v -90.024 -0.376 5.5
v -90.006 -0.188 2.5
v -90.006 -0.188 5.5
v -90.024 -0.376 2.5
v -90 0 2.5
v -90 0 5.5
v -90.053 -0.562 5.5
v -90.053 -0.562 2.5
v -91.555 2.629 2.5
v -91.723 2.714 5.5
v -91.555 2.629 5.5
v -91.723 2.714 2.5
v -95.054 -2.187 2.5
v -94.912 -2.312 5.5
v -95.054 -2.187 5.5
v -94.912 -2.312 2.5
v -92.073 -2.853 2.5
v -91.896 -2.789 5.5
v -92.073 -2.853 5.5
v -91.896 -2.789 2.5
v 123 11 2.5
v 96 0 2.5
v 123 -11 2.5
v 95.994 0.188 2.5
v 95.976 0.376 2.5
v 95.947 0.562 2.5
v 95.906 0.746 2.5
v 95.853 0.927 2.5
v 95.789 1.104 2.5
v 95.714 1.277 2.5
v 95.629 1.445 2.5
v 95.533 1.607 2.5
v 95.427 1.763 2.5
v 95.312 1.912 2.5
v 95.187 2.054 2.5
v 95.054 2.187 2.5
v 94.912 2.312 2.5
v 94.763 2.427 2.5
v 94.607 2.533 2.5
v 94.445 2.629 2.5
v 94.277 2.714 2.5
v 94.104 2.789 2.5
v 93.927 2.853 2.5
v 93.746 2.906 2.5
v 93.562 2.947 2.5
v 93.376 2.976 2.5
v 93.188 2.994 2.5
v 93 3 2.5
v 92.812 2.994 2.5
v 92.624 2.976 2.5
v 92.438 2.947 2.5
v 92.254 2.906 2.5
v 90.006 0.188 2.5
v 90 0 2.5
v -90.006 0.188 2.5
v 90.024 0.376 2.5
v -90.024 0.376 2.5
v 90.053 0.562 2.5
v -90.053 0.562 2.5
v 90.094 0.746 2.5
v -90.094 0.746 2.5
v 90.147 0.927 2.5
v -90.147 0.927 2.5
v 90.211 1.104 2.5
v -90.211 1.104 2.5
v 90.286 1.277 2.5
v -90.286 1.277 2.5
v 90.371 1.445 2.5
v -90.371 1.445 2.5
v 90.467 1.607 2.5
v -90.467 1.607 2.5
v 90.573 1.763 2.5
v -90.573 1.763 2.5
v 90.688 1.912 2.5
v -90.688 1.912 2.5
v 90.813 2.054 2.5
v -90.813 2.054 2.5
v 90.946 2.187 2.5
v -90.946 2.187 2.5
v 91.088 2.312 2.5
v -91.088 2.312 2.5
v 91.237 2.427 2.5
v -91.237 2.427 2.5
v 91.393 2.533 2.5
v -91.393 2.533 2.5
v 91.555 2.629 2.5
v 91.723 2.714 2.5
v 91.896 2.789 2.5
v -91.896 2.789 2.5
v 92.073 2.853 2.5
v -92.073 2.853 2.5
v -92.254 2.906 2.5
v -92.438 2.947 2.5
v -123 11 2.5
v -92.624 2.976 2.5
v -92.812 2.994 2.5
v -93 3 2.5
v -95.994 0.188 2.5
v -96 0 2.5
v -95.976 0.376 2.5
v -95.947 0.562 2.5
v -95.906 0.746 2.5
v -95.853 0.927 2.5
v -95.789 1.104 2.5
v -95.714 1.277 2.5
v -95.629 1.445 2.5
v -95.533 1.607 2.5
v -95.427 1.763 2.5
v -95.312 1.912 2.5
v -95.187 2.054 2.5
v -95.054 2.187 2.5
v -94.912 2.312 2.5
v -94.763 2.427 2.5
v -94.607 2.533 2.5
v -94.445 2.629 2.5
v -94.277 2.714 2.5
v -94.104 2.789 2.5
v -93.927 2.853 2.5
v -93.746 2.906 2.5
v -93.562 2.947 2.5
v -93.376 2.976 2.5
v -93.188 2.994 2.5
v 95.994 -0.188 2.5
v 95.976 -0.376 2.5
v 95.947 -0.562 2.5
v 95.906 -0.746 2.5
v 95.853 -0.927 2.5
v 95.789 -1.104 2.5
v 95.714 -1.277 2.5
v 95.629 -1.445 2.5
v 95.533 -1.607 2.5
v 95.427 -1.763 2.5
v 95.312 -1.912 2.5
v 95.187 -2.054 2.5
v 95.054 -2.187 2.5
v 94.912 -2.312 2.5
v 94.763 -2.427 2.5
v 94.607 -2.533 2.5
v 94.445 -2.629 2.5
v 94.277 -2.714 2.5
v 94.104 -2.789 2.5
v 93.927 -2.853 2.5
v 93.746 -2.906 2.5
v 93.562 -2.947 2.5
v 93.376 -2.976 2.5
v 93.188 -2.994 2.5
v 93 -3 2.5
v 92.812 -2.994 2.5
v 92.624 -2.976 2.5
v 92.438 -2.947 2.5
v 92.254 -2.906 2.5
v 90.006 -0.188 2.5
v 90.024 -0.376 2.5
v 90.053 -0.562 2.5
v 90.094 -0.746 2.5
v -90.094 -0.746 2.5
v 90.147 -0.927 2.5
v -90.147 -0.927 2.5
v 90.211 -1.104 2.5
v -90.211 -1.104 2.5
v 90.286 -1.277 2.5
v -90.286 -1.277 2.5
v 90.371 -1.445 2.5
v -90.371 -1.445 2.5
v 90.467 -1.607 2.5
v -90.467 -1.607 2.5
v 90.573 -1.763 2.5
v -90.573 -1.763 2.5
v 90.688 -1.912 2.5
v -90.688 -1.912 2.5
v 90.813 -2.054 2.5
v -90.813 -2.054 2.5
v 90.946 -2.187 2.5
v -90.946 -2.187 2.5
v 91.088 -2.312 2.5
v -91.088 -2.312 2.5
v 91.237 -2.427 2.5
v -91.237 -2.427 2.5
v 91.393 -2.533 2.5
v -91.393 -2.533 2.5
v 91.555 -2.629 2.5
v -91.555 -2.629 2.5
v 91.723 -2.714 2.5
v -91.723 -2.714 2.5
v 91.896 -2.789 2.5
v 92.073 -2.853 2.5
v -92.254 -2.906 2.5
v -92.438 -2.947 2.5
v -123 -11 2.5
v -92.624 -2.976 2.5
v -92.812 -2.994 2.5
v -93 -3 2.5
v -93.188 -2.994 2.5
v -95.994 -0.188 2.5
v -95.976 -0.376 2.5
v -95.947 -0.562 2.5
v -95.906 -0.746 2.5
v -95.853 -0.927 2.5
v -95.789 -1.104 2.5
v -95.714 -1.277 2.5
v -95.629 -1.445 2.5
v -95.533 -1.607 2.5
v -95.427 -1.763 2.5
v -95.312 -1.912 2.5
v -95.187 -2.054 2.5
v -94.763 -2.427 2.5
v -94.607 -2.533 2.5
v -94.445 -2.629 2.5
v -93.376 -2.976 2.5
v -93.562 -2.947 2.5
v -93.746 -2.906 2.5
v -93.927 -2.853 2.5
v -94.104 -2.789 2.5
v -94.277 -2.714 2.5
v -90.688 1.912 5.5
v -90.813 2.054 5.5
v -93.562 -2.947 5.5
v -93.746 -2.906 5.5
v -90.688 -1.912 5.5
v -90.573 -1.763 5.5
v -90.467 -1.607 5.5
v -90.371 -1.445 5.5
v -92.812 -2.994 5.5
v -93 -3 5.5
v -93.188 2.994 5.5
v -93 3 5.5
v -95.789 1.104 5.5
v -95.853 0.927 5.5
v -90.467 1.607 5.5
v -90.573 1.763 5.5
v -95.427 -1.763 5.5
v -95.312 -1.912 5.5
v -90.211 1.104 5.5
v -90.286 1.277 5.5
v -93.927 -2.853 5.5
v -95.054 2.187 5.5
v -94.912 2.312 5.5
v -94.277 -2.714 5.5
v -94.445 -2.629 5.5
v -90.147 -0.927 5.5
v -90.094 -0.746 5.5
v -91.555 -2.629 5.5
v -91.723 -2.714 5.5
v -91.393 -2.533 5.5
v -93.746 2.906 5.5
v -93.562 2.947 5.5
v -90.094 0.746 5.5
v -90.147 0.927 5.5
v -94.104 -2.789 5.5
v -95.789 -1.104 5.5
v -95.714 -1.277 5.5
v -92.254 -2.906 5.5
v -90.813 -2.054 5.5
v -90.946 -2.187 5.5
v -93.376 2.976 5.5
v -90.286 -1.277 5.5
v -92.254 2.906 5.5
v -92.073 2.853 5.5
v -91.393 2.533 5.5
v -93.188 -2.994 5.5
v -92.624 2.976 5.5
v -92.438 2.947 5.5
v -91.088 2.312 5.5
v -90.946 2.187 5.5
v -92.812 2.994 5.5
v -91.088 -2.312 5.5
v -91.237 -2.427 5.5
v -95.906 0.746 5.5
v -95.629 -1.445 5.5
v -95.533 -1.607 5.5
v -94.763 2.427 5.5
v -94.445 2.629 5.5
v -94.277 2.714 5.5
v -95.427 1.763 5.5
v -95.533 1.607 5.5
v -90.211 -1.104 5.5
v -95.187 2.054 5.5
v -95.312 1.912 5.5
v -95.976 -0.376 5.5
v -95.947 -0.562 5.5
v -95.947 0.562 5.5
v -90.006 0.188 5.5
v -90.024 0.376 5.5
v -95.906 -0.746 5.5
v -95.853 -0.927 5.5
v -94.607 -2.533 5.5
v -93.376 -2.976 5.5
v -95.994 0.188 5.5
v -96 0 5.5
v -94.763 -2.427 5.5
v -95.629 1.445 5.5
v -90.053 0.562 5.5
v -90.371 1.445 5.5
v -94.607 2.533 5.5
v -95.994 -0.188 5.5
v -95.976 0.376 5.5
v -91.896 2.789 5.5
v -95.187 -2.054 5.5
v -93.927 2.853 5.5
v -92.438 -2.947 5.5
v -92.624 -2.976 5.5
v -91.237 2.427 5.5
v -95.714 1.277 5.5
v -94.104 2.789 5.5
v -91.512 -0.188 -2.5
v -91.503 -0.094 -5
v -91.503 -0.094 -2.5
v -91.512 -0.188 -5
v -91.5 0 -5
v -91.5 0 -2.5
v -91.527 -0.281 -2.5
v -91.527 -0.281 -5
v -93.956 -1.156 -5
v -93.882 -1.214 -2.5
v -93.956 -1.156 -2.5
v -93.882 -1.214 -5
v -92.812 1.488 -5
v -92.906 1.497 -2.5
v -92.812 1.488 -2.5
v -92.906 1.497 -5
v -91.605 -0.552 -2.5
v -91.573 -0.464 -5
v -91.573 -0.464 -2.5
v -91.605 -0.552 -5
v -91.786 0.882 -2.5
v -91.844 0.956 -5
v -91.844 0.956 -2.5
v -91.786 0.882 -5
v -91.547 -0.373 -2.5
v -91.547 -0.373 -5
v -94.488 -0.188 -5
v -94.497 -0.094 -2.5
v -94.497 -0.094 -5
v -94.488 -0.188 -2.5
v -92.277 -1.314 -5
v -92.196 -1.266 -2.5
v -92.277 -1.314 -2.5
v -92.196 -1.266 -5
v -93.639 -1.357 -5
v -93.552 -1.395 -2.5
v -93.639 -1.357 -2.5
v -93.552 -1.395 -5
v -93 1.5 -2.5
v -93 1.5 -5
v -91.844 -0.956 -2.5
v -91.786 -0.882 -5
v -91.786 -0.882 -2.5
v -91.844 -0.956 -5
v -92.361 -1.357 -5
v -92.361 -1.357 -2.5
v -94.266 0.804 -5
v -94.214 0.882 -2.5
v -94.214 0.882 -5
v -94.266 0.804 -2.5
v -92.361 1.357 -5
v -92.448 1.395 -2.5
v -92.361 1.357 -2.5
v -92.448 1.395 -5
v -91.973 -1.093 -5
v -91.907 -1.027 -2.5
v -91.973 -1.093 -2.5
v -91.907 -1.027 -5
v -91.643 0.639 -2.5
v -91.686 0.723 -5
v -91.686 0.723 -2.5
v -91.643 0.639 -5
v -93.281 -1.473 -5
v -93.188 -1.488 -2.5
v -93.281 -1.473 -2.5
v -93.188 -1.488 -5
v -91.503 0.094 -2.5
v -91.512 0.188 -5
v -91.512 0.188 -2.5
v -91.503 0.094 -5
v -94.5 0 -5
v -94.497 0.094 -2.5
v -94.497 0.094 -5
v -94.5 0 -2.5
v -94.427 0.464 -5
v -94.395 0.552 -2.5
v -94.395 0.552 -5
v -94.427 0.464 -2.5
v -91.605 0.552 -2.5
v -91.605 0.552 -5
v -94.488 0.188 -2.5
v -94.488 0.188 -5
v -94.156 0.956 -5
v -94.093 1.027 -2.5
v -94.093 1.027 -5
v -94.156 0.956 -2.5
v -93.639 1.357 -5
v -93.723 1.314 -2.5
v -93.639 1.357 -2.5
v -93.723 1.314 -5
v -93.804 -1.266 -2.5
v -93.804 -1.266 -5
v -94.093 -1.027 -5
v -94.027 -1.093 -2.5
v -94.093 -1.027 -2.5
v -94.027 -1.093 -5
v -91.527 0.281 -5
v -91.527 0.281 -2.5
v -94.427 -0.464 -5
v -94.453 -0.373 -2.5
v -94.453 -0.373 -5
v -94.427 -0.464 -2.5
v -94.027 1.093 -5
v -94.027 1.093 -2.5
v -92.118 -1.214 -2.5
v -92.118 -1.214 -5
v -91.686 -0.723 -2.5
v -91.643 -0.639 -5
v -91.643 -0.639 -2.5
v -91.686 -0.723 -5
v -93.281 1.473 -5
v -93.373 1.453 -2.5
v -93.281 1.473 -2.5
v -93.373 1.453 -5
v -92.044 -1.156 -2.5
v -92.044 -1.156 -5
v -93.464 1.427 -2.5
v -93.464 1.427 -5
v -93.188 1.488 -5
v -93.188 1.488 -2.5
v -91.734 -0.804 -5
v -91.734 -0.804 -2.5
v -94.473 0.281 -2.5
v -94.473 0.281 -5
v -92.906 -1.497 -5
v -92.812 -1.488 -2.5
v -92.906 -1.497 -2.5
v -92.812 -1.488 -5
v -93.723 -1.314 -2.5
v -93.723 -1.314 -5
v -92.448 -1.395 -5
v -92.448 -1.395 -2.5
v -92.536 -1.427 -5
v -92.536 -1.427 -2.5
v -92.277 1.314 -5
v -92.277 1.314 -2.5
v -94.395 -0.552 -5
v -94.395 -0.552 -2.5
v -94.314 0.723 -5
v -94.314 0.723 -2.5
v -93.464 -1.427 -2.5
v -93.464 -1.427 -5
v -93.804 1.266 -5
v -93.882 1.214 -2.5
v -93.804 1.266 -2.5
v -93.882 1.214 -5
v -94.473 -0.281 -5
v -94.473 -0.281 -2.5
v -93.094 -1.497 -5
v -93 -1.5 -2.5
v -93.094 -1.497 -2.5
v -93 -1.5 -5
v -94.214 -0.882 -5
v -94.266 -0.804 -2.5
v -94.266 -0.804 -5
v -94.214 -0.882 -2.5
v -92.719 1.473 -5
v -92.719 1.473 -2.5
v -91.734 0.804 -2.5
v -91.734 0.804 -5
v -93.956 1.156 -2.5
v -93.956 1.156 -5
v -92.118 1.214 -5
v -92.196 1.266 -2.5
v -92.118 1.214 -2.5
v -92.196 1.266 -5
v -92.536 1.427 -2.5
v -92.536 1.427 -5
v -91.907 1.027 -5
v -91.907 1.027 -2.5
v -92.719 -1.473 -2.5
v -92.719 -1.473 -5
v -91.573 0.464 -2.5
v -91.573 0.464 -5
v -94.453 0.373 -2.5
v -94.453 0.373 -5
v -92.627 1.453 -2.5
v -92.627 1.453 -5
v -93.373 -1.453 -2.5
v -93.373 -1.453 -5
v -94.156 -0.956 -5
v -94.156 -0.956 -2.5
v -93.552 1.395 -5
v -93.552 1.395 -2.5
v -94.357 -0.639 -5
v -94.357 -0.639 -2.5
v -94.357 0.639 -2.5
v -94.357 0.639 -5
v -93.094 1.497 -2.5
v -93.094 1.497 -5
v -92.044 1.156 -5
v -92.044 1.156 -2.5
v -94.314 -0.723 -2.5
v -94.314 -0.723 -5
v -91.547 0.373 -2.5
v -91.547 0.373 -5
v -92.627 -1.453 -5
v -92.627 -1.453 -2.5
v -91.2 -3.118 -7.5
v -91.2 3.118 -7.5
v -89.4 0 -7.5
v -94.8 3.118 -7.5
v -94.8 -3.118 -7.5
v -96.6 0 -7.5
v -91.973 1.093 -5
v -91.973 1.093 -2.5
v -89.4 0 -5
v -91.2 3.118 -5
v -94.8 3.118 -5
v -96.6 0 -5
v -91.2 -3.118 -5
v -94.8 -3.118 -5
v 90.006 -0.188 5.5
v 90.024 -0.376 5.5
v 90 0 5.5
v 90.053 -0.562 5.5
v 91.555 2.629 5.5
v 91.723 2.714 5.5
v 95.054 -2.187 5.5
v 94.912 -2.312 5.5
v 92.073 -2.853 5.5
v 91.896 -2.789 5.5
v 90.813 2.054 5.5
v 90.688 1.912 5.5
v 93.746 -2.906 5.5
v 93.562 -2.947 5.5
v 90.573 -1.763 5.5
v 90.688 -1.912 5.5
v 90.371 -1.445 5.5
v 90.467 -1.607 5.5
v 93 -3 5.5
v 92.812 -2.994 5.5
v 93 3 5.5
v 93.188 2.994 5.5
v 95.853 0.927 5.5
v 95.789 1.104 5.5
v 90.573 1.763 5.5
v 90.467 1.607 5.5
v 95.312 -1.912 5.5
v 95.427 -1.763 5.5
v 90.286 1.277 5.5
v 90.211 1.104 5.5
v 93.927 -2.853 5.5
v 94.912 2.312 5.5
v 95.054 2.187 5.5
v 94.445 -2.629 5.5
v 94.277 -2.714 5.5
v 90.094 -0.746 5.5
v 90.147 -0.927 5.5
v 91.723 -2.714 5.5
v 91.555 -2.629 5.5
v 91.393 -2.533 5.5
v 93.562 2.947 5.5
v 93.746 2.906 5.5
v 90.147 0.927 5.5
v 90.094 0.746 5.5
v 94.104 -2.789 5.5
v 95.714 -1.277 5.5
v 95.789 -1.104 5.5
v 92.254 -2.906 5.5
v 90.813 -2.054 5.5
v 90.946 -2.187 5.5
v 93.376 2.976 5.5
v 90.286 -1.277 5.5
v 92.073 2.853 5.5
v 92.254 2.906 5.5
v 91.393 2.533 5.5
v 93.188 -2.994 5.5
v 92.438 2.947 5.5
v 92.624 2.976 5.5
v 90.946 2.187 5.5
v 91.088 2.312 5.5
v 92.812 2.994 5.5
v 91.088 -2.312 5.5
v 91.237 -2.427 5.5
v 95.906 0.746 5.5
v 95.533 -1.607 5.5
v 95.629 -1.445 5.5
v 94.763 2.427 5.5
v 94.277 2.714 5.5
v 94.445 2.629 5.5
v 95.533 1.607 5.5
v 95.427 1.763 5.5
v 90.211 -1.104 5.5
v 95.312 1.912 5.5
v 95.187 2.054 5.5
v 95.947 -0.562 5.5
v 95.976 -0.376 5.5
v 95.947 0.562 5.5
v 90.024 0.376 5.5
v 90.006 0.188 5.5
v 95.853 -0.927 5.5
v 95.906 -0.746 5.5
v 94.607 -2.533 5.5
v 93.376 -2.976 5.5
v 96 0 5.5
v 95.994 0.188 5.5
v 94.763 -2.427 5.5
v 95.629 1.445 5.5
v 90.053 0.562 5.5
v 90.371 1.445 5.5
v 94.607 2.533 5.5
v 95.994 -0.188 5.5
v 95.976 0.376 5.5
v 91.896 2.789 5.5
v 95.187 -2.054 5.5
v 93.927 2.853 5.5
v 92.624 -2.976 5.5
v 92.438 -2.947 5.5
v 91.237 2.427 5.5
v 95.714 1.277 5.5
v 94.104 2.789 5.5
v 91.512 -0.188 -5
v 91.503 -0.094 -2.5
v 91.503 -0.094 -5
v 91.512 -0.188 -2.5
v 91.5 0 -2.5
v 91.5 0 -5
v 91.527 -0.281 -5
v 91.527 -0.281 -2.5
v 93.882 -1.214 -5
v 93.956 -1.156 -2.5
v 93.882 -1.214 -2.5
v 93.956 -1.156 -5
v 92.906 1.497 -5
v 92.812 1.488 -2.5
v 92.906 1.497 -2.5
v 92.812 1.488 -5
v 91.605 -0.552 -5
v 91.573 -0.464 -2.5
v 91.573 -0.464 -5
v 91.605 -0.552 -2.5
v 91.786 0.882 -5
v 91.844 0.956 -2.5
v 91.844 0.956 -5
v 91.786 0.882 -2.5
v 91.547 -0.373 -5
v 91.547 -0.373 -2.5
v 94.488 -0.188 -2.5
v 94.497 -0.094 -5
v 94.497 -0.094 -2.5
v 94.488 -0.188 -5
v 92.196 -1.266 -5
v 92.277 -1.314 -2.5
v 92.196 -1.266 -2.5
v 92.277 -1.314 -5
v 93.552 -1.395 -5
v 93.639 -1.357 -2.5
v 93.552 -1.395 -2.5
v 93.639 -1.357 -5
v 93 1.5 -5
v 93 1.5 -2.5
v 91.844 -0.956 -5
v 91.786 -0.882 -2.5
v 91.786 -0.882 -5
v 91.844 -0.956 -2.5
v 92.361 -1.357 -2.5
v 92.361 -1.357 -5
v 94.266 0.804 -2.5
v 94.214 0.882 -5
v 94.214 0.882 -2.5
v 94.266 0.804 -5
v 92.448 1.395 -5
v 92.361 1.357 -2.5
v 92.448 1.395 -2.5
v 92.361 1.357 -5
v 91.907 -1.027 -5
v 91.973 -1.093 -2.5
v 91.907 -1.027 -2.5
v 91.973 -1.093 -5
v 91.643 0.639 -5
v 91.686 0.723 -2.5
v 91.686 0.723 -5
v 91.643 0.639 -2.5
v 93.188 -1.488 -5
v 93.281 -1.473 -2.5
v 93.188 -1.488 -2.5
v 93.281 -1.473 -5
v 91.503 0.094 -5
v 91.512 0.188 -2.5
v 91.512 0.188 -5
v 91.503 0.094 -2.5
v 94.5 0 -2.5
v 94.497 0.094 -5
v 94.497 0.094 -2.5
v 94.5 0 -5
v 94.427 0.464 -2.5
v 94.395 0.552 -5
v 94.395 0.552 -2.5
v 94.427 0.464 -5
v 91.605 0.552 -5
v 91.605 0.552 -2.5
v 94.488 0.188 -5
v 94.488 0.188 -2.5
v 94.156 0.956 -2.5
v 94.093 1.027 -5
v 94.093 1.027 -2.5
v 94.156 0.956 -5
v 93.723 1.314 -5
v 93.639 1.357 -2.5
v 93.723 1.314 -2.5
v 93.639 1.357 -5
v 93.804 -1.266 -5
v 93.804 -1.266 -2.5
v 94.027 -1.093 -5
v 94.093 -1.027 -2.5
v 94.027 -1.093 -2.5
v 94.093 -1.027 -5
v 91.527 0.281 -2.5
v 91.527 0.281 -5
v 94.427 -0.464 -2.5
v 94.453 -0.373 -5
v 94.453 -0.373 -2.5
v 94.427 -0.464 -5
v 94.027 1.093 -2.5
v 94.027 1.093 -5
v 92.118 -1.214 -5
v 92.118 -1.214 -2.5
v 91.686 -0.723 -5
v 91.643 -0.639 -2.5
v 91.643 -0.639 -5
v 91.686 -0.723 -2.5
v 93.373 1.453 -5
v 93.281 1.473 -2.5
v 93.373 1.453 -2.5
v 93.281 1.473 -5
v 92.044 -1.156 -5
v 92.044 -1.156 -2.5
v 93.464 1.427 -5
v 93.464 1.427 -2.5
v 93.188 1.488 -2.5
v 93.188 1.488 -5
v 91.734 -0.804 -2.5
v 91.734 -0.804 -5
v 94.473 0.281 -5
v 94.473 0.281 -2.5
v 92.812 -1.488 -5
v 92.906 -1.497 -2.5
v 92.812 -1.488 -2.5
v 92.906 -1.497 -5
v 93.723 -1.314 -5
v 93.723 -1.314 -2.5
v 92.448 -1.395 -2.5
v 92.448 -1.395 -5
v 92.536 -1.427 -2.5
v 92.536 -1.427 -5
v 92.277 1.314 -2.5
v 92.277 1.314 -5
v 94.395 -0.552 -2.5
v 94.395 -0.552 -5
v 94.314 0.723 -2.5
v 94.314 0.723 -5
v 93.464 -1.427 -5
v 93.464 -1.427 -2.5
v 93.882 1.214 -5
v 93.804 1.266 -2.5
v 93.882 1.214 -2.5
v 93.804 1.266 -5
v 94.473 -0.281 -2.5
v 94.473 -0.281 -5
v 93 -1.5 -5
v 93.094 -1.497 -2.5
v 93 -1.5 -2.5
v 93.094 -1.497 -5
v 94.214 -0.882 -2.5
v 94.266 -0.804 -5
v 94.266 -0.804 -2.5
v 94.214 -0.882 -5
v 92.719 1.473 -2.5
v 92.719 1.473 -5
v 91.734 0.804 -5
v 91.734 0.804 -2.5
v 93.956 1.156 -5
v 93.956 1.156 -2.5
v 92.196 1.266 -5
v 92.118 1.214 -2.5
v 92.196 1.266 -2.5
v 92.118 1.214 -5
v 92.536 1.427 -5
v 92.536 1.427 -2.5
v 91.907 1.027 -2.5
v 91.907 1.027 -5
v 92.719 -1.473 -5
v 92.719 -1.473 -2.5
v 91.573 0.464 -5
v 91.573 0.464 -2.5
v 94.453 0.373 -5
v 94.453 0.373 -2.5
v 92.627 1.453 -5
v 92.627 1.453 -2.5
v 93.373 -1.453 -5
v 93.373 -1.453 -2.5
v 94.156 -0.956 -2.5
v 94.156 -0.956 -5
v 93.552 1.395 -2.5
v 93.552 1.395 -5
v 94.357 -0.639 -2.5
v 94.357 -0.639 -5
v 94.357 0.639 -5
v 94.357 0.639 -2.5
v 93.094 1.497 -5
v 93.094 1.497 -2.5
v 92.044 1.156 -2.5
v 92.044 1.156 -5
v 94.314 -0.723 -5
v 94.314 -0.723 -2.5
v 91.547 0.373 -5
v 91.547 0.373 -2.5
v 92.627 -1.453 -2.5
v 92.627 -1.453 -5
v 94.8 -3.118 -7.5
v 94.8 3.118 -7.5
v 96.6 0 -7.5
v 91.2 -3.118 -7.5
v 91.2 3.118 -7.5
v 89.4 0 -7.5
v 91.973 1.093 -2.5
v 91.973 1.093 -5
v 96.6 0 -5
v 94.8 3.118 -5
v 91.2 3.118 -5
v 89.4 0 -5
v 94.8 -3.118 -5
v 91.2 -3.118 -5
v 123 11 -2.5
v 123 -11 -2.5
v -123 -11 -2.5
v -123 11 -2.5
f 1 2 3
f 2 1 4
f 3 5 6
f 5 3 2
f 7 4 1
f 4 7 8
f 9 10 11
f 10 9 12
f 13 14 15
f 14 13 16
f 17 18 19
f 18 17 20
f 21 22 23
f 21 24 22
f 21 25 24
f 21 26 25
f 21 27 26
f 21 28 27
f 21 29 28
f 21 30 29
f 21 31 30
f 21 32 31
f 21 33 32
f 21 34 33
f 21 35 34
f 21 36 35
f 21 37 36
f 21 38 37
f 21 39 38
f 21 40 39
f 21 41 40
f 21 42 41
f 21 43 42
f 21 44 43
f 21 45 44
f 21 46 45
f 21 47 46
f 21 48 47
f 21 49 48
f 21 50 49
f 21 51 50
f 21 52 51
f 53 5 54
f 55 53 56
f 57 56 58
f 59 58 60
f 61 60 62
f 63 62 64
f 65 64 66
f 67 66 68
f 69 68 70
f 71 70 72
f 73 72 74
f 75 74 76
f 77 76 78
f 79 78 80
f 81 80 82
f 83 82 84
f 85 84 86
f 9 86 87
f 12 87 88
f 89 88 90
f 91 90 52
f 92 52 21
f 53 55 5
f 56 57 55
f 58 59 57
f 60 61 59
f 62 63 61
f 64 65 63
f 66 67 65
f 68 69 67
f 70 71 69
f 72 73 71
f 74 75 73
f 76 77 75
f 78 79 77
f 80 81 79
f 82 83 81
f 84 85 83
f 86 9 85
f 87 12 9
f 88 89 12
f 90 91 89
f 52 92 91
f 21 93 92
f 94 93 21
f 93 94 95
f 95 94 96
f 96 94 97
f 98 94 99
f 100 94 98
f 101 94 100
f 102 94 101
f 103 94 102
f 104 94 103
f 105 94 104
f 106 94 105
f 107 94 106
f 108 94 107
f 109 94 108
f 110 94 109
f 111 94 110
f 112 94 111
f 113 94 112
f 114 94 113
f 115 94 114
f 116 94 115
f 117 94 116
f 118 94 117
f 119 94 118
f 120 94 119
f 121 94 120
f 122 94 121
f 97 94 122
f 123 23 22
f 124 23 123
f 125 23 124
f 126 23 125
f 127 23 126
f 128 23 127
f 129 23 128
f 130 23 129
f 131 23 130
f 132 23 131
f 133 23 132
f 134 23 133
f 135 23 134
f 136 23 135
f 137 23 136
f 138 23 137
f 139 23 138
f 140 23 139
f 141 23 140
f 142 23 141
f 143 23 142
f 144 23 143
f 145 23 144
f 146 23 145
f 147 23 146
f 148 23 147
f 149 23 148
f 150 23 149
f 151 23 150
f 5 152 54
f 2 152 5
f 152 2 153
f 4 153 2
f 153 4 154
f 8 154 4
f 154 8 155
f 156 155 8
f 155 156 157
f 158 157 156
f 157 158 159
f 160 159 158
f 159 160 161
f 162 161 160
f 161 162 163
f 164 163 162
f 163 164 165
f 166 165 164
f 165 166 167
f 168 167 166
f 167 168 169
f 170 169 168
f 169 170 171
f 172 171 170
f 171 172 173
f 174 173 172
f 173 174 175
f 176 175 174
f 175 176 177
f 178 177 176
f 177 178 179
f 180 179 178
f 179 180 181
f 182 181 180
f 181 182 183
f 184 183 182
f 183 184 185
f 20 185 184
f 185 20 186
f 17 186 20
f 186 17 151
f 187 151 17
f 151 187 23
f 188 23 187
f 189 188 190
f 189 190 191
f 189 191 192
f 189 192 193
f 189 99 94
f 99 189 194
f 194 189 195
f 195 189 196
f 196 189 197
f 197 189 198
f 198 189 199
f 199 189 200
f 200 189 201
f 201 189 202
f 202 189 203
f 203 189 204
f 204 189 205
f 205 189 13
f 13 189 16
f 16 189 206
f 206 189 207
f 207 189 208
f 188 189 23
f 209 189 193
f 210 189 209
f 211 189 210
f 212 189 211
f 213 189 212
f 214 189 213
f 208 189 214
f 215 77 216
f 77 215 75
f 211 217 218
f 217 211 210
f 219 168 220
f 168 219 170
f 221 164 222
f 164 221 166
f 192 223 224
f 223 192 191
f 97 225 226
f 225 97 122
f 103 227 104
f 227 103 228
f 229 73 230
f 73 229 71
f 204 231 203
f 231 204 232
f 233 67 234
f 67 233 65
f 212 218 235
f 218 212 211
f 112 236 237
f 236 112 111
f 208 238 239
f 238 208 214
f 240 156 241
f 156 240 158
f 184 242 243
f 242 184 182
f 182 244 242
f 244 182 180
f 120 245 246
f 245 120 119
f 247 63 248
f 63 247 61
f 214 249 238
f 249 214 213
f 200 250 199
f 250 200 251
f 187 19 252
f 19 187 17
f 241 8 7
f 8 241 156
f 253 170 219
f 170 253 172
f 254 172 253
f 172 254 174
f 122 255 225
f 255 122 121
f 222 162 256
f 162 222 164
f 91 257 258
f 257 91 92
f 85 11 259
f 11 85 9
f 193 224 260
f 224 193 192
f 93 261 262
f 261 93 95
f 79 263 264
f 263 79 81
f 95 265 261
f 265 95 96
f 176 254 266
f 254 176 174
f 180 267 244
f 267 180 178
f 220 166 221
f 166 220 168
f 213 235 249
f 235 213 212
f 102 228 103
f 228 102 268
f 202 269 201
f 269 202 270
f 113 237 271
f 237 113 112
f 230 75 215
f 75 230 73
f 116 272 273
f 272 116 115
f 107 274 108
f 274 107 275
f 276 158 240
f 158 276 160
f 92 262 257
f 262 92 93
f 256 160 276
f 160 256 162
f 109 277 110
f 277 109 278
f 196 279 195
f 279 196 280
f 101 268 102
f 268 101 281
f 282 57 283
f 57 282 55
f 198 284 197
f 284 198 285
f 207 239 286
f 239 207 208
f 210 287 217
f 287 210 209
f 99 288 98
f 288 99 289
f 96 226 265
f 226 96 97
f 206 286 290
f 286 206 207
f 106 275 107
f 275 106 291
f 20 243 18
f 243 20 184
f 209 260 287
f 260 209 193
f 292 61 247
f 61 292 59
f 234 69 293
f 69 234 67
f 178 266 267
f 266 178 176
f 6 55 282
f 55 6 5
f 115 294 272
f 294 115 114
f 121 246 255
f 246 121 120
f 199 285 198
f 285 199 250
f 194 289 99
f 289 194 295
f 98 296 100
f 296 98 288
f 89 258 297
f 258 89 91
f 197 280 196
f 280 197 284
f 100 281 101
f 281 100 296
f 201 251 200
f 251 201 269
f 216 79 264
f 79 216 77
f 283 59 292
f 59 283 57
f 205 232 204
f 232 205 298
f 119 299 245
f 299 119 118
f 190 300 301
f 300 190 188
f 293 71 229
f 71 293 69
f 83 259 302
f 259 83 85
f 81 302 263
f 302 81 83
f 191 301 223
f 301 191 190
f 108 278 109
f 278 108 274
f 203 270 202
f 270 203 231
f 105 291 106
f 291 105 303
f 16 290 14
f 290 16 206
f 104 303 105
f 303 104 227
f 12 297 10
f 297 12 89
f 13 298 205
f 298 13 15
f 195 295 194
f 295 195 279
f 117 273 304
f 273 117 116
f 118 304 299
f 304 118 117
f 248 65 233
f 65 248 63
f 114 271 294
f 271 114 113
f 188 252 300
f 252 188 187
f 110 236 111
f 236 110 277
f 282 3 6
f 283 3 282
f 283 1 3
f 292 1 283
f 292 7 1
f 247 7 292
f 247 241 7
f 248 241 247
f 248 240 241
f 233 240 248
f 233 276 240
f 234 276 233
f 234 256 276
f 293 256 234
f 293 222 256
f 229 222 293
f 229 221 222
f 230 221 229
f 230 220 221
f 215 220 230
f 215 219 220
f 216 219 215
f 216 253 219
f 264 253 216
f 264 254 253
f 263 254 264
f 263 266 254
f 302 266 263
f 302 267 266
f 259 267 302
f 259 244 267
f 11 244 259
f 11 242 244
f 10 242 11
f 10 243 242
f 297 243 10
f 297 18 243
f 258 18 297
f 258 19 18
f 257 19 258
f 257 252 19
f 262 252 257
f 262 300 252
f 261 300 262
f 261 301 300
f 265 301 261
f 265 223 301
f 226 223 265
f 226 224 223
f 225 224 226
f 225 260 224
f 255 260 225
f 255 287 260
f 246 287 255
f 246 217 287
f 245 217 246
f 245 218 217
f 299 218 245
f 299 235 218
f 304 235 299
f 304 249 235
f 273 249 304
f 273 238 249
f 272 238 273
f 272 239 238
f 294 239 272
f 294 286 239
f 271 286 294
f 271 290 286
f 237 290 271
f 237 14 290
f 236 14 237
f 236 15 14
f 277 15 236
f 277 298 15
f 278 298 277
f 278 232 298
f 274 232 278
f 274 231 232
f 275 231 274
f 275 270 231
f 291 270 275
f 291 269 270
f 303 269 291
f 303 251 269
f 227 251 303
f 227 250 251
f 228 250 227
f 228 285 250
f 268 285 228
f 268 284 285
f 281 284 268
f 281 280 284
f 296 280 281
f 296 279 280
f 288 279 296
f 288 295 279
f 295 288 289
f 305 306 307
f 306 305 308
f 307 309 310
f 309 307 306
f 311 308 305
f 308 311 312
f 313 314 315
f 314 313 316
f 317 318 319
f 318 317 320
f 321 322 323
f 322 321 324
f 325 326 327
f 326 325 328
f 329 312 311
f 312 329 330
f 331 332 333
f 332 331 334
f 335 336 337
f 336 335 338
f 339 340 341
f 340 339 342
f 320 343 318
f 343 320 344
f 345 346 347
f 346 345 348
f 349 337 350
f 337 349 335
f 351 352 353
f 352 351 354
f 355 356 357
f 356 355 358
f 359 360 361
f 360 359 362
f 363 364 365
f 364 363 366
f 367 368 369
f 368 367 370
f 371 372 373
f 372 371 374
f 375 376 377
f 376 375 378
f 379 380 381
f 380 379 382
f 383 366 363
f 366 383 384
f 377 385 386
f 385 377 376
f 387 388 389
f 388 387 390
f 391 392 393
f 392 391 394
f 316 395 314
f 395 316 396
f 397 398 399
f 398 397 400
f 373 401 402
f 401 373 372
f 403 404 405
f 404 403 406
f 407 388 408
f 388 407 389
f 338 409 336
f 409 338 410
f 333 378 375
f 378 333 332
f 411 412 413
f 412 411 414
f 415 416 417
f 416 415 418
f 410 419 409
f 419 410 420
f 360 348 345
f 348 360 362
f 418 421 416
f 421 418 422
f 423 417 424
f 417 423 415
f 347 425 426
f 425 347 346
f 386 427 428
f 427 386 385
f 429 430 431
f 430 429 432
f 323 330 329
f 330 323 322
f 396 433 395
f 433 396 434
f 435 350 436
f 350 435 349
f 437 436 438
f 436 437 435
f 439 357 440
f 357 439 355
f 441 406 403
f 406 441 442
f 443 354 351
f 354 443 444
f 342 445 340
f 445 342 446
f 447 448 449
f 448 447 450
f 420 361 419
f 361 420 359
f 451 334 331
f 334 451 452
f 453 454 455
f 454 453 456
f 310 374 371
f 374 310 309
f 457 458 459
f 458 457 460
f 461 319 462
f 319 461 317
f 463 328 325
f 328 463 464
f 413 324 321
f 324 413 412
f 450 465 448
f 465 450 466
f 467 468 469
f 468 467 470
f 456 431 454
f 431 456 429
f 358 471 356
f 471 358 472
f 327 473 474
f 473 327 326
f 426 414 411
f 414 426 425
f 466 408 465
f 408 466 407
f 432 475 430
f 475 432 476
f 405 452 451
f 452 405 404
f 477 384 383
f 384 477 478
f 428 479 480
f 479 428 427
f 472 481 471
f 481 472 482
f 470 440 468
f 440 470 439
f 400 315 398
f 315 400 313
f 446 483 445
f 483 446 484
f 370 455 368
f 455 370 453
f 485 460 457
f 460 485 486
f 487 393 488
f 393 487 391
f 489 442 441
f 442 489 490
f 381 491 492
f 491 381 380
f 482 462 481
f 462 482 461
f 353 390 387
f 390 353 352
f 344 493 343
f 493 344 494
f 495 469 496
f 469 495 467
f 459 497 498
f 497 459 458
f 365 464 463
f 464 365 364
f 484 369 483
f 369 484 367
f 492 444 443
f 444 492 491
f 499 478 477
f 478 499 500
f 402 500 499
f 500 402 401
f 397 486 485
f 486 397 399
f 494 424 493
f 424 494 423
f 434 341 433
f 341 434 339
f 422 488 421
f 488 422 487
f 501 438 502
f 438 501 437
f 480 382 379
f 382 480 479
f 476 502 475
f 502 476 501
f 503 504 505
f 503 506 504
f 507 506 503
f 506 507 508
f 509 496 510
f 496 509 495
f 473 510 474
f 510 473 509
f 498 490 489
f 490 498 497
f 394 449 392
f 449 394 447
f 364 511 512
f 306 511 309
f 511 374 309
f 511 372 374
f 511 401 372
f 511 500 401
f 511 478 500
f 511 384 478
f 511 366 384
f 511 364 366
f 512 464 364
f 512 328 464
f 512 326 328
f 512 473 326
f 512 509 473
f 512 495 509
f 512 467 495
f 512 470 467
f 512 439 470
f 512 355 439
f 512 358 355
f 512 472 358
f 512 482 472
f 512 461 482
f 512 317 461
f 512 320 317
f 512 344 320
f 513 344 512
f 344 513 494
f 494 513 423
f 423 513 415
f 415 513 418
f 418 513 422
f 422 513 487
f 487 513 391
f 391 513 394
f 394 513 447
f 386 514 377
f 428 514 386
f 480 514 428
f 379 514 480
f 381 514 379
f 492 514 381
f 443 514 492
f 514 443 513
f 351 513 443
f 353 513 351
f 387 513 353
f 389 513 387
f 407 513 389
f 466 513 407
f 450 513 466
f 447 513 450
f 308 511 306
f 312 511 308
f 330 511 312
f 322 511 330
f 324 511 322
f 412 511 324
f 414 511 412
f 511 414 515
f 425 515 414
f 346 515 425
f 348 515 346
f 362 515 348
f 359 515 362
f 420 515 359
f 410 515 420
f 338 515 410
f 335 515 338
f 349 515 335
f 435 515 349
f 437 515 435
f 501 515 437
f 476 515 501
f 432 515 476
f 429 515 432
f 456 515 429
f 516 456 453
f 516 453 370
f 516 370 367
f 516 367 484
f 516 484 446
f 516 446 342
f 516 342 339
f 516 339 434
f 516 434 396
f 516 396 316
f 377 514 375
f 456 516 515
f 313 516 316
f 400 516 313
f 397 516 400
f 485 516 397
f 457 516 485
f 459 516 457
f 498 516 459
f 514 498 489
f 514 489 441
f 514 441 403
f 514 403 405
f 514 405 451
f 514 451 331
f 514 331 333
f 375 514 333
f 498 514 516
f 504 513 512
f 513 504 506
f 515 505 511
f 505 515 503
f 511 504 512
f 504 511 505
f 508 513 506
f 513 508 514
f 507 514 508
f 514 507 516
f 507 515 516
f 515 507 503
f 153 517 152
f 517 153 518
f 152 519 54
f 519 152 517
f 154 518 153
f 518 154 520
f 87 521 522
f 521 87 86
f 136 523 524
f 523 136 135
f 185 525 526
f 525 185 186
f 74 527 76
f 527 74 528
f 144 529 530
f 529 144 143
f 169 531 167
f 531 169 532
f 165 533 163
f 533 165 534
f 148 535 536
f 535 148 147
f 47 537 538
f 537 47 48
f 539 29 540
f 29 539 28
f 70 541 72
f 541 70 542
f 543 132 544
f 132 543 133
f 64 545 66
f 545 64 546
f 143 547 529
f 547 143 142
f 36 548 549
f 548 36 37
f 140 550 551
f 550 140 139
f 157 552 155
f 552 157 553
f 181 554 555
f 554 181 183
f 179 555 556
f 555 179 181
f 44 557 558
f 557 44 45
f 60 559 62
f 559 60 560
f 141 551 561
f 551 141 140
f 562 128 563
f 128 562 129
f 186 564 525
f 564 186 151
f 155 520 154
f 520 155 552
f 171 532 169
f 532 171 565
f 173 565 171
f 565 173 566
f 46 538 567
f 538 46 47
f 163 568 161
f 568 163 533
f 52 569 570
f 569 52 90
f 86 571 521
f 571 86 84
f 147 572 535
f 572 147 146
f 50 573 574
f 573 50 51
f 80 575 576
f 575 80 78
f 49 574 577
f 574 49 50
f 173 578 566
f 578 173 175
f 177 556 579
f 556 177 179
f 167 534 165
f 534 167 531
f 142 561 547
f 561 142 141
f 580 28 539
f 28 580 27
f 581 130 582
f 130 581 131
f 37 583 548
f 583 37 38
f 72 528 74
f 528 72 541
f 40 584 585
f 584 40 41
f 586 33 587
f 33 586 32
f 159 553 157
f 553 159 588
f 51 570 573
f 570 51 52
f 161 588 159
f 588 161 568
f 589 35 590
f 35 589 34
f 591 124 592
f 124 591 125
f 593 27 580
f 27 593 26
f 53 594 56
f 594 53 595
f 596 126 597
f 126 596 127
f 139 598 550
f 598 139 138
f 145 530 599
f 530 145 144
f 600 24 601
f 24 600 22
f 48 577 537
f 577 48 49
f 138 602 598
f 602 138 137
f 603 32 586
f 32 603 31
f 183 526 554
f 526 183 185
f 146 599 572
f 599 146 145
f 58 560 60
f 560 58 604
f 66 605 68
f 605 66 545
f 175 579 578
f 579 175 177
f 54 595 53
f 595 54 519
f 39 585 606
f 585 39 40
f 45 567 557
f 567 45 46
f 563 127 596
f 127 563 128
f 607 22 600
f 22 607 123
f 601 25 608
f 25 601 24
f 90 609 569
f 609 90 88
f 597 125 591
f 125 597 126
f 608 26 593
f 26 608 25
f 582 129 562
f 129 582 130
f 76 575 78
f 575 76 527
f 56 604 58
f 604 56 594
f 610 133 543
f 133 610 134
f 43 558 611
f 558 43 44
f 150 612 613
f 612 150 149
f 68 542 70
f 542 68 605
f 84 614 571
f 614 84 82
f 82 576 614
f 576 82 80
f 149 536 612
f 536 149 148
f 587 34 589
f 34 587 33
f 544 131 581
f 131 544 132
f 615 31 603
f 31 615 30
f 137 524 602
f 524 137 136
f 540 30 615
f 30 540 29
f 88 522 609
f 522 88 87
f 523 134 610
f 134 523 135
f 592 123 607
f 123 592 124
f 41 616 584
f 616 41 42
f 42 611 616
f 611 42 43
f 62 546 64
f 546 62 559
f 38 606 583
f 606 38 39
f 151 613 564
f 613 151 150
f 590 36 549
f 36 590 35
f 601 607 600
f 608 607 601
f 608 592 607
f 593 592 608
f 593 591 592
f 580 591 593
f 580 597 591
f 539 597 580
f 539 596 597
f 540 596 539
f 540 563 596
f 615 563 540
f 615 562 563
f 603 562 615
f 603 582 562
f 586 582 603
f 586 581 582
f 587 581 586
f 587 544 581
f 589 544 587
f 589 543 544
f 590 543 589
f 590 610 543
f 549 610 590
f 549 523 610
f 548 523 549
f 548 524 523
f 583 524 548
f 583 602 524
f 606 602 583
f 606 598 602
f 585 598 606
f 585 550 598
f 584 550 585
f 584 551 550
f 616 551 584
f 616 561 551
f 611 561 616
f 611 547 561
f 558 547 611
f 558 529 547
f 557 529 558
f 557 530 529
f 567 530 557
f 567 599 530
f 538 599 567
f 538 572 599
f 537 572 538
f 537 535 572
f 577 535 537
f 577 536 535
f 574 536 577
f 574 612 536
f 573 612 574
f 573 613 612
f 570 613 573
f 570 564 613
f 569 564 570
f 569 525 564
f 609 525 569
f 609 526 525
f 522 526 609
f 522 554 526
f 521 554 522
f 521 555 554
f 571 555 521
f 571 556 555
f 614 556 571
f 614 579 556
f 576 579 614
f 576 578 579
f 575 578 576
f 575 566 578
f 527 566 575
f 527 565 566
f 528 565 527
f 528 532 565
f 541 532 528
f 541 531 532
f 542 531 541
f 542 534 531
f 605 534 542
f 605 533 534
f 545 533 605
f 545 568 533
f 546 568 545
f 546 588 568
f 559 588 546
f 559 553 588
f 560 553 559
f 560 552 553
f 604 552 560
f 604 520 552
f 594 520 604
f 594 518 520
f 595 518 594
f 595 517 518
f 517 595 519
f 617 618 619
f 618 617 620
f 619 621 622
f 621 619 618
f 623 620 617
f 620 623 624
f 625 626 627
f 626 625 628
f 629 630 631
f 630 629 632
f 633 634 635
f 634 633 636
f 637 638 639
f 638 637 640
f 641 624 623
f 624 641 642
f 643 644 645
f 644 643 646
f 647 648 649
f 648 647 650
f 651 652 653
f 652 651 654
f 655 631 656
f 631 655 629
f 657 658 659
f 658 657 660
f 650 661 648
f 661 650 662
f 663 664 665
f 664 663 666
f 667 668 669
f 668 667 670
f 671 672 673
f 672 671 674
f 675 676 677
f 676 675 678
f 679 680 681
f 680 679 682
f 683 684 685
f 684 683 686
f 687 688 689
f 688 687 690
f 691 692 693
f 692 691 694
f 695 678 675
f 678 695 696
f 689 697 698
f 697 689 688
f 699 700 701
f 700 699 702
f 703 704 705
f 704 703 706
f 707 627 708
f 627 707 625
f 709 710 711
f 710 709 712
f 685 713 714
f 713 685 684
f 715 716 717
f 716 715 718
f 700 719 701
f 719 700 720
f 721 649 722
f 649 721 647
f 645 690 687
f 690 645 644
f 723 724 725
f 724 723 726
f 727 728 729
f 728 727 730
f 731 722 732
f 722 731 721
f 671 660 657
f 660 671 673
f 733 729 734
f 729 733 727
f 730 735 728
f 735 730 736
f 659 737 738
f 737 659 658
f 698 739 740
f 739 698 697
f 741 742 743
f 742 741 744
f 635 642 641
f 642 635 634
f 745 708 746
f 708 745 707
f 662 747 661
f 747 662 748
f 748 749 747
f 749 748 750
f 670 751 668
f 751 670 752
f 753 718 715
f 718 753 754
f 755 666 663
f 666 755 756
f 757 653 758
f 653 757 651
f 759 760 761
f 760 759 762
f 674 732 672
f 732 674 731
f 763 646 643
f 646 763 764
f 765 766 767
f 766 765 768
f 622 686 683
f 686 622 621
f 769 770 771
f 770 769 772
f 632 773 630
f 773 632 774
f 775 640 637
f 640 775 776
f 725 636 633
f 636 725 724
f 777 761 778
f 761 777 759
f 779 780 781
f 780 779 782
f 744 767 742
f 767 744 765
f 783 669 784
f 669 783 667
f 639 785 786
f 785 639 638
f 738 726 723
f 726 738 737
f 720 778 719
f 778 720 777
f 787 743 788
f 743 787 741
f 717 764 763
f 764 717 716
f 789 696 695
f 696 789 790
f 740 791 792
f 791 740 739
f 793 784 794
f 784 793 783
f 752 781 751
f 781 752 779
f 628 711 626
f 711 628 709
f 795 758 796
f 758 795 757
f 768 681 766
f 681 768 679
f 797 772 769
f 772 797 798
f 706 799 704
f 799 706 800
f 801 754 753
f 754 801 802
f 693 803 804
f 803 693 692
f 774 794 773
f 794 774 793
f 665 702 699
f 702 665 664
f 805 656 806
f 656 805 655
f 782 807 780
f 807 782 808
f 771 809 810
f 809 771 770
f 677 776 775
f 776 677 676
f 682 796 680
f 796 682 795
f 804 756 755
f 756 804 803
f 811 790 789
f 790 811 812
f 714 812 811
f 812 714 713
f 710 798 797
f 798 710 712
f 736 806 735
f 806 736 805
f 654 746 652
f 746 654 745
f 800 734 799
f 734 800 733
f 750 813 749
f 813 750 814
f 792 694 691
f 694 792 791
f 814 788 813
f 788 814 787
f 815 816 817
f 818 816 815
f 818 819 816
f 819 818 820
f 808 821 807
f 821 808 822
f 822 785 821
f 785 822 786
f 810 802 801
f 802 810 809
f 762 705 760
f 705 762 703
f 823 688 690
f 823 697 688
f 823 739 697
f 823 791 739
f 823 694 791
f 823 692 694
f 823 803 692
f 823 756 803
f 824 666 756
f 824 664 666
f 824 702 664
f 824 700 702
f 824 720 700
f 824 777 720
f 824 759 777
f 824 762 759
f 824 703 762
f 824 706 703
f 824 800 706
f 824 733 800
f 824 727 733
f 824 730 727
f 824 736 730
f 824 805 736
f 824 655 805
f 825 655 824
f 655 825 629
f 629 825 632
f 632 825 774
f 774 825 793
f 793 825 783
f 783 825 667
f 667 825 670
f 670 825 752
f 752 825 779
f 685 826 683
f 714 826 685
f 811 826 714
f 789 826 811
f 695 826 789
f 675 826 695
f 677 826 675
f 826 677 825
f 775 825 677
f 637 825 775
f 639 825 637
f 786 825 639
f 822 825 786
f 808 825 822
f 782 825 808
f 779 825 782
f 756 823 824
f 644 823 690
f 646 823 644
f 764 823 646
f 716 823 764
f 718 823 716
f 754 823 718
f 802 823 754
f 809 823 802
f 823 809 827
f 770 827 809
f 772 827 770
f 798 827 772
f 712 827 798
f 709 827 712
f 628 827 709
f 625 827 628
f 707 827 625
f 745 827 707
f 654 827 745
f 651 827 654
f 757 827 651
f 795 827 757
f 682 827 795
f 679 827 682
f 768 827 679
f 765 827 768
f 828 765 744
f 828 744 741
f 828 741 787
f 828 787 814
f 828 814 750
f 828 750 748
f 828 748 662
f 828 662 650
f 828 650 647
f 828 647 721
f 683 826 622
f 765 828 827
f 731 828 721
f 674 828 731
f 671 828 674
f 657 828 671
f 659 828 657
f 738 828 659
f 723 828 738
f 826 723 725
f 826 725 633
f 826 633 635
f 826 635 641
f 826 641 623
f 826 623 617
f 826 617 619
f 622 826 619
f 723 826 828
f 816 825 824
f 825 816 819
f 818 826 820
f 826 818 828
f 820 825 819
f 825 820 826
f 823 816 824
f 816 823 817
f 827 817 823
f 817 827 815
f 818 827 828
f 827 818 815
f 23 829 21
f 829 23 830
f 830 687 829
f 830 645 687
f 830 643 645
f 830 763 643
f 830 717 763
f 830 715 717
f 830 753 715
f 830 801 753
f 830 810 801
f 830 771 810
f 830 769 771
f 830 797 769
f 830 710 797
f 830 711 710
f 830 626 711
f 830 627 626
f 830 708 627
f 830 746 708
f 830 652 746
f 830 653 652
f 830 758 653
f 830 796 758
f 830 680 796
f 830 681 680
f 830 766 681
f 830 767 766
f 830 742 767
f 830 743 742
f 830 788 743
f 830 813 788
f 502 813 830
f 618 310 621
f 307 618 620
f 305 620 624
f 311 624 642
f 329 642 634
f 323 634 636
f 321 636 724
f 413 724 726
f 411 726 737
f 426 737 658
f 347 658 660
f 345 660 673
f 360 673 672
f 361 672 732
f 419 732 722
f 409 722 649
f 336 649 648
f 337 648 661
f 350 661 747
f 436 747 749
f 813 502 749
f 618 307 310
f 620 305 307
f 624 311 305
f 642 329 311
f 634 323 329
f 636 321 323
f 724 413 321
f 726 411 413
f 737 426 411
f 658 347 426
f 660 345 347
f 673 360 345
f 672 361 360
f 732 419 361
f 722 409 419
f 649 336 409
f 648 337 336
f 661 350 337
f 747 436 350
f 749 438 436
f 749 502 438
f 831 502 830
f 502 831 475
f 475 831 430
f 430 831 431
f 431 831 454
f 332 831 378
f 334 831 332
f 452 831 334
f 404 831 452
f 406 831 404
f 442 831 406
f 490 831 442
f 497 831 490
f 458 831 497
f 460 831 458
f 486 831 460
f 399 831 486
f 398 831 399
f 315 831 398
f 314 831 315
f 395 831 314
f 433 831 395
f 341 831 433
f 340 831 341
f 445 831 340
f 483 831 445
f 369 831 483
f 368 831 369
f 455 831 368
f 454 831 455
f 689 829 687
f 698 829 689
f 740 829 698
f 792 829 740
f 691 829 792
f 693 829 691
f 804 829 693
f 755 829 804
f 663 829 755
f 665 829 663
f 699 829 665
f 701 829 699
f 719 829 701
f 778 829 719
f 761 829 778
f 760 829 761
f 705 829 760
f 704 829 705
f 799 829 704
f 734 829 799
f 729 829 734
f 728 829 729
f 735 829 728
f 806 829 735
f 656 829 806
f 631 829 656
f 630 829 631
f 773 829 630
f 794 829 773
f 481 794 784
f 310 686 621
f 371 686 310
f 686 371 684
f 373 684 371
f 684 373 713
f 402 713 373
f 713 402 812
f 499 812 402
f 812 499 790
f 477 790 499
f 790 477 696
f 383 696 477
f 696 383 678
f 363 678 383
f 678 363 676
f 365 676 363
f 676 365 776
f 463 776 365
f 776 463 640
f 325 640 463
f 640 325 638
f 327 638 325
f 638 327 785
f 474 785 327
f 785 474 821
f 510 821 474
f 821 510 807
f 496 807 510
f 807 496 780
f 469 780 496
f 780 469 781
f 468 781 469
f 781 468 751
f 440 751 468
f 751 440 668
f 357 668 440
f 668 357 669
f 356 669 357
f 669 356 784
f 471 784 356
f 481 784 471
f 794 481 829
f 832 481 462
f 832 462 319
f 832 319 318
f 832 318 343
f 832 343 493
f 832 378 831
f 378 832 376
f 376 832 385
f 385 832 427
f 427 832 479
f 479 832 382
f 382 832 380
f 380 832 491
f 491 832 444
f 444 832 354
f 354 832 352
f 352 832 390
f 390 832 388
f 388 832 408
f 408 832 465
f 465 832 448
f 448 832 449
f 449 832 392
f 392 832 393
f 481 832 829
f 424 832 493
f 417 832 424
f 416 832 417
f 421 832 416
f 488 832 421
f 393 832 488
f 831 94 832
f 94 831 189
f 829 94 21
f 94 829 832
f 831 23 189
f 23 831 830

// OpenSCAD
// file: nut.scad
// 1.5^2 + y^2 = 3^2
// sqrt(3^2 - 1.5^2)
//       30
//    /   |
// 60  - 90
// cos(30) = x / 3
// x = 3 cos(30)
module hex(side_length=3) {
  points = [[0,0], [side_length, 0], [side_length / 2, side_length * cos(30)]];
  for (i=[0:1:5]) {
    rotate([0,0,i * 60]) polygon(points);
  }
}

module hex_nut(side_length=3, height=2) {
    linear_extrude(height=height) hex(side_length);
}

module square_nut(side_length=5, height=2, _offset=0) {
    cube([5 + _offset,5,2]);
}
// file: screw.scad
$fn=100;

module screw(screw_head_radius=3, screw_head_height=3, threaded_radius=1.5, threaded_height=10) {
  // screw head
  cylinder(h=screw_head_height, r=screw_head_radius);

  translate([0, 0, screw_head_height]) {
    cylinder(h=threaded_height, r=threaded_radius);
  }
}

// m3x10
screw(screw_head_radius=3, screw_head_height=3, threaded_radius=1.5, threaded_height=10);
// file: screw_with_nut.scad
use <screw.scad>
use <nut.scad>

module screw_with_nut(
  hex_nut_height=2.5,
  screw_head_height=3,
  threaded_height=10,
  threaded_radius=1.5,
  screw_head_radius=3,
  hex_nut_side_length=3.6,
  square_nut_height=2,
  square_nut_side_length=5,
  nut_type="hex"
) {
  screw(screw_head_radius=screw_head_radius, screw_head_height=screw_head_height, threaded_radius=threaded_radius, threaded_height=threaded_height);

  if (nut_type == "hex") {
    translate([0,0, screw_head_height + threaded_height - hex_nut_height]) {
      hex_nut(side_length=hex_nut_side_length, height=hex_nut_height);
    }
  }

  else if (nut_type == "square"){
    rotate([0,0,-90])
    translate([
        -square_nut_side_length / 2,
        -square_nut_side_length / 2,
        screw_head_height + threaded_height - square_nut_height
    ]) {
      square_nut(
          side_length=square_nut_side_length,
          height=square_nut_height,
          _offset=5);
    }
  }

}

screw_with_nut(nut_type="square");
// main file
use <screw_with_nut.scad>

module left_screw_nut() {
  translate([-93,0,5.5]) {
    rotate([180,0,0])
    screw_with_nut();
  }
}

module flexible_handle(screw) {
  if (!screw) {
    cube([246, 22, 5], center=true);
  }
  left_screw_nut();
  mirror([1,0,0])
    left_screw_nut();
}

module flexible_handle_for_laminair(fan_diameter, filter_y, depth, filter_z, grid_z, screw=true) {
  translate([0,filter_y / 2 + depth + 2.5,(filter_z + grid_z)/ 2]) {
    rotate([-90,0,0])
      flexible_handle(screw=screw);
  }
}

flexible_handle();
